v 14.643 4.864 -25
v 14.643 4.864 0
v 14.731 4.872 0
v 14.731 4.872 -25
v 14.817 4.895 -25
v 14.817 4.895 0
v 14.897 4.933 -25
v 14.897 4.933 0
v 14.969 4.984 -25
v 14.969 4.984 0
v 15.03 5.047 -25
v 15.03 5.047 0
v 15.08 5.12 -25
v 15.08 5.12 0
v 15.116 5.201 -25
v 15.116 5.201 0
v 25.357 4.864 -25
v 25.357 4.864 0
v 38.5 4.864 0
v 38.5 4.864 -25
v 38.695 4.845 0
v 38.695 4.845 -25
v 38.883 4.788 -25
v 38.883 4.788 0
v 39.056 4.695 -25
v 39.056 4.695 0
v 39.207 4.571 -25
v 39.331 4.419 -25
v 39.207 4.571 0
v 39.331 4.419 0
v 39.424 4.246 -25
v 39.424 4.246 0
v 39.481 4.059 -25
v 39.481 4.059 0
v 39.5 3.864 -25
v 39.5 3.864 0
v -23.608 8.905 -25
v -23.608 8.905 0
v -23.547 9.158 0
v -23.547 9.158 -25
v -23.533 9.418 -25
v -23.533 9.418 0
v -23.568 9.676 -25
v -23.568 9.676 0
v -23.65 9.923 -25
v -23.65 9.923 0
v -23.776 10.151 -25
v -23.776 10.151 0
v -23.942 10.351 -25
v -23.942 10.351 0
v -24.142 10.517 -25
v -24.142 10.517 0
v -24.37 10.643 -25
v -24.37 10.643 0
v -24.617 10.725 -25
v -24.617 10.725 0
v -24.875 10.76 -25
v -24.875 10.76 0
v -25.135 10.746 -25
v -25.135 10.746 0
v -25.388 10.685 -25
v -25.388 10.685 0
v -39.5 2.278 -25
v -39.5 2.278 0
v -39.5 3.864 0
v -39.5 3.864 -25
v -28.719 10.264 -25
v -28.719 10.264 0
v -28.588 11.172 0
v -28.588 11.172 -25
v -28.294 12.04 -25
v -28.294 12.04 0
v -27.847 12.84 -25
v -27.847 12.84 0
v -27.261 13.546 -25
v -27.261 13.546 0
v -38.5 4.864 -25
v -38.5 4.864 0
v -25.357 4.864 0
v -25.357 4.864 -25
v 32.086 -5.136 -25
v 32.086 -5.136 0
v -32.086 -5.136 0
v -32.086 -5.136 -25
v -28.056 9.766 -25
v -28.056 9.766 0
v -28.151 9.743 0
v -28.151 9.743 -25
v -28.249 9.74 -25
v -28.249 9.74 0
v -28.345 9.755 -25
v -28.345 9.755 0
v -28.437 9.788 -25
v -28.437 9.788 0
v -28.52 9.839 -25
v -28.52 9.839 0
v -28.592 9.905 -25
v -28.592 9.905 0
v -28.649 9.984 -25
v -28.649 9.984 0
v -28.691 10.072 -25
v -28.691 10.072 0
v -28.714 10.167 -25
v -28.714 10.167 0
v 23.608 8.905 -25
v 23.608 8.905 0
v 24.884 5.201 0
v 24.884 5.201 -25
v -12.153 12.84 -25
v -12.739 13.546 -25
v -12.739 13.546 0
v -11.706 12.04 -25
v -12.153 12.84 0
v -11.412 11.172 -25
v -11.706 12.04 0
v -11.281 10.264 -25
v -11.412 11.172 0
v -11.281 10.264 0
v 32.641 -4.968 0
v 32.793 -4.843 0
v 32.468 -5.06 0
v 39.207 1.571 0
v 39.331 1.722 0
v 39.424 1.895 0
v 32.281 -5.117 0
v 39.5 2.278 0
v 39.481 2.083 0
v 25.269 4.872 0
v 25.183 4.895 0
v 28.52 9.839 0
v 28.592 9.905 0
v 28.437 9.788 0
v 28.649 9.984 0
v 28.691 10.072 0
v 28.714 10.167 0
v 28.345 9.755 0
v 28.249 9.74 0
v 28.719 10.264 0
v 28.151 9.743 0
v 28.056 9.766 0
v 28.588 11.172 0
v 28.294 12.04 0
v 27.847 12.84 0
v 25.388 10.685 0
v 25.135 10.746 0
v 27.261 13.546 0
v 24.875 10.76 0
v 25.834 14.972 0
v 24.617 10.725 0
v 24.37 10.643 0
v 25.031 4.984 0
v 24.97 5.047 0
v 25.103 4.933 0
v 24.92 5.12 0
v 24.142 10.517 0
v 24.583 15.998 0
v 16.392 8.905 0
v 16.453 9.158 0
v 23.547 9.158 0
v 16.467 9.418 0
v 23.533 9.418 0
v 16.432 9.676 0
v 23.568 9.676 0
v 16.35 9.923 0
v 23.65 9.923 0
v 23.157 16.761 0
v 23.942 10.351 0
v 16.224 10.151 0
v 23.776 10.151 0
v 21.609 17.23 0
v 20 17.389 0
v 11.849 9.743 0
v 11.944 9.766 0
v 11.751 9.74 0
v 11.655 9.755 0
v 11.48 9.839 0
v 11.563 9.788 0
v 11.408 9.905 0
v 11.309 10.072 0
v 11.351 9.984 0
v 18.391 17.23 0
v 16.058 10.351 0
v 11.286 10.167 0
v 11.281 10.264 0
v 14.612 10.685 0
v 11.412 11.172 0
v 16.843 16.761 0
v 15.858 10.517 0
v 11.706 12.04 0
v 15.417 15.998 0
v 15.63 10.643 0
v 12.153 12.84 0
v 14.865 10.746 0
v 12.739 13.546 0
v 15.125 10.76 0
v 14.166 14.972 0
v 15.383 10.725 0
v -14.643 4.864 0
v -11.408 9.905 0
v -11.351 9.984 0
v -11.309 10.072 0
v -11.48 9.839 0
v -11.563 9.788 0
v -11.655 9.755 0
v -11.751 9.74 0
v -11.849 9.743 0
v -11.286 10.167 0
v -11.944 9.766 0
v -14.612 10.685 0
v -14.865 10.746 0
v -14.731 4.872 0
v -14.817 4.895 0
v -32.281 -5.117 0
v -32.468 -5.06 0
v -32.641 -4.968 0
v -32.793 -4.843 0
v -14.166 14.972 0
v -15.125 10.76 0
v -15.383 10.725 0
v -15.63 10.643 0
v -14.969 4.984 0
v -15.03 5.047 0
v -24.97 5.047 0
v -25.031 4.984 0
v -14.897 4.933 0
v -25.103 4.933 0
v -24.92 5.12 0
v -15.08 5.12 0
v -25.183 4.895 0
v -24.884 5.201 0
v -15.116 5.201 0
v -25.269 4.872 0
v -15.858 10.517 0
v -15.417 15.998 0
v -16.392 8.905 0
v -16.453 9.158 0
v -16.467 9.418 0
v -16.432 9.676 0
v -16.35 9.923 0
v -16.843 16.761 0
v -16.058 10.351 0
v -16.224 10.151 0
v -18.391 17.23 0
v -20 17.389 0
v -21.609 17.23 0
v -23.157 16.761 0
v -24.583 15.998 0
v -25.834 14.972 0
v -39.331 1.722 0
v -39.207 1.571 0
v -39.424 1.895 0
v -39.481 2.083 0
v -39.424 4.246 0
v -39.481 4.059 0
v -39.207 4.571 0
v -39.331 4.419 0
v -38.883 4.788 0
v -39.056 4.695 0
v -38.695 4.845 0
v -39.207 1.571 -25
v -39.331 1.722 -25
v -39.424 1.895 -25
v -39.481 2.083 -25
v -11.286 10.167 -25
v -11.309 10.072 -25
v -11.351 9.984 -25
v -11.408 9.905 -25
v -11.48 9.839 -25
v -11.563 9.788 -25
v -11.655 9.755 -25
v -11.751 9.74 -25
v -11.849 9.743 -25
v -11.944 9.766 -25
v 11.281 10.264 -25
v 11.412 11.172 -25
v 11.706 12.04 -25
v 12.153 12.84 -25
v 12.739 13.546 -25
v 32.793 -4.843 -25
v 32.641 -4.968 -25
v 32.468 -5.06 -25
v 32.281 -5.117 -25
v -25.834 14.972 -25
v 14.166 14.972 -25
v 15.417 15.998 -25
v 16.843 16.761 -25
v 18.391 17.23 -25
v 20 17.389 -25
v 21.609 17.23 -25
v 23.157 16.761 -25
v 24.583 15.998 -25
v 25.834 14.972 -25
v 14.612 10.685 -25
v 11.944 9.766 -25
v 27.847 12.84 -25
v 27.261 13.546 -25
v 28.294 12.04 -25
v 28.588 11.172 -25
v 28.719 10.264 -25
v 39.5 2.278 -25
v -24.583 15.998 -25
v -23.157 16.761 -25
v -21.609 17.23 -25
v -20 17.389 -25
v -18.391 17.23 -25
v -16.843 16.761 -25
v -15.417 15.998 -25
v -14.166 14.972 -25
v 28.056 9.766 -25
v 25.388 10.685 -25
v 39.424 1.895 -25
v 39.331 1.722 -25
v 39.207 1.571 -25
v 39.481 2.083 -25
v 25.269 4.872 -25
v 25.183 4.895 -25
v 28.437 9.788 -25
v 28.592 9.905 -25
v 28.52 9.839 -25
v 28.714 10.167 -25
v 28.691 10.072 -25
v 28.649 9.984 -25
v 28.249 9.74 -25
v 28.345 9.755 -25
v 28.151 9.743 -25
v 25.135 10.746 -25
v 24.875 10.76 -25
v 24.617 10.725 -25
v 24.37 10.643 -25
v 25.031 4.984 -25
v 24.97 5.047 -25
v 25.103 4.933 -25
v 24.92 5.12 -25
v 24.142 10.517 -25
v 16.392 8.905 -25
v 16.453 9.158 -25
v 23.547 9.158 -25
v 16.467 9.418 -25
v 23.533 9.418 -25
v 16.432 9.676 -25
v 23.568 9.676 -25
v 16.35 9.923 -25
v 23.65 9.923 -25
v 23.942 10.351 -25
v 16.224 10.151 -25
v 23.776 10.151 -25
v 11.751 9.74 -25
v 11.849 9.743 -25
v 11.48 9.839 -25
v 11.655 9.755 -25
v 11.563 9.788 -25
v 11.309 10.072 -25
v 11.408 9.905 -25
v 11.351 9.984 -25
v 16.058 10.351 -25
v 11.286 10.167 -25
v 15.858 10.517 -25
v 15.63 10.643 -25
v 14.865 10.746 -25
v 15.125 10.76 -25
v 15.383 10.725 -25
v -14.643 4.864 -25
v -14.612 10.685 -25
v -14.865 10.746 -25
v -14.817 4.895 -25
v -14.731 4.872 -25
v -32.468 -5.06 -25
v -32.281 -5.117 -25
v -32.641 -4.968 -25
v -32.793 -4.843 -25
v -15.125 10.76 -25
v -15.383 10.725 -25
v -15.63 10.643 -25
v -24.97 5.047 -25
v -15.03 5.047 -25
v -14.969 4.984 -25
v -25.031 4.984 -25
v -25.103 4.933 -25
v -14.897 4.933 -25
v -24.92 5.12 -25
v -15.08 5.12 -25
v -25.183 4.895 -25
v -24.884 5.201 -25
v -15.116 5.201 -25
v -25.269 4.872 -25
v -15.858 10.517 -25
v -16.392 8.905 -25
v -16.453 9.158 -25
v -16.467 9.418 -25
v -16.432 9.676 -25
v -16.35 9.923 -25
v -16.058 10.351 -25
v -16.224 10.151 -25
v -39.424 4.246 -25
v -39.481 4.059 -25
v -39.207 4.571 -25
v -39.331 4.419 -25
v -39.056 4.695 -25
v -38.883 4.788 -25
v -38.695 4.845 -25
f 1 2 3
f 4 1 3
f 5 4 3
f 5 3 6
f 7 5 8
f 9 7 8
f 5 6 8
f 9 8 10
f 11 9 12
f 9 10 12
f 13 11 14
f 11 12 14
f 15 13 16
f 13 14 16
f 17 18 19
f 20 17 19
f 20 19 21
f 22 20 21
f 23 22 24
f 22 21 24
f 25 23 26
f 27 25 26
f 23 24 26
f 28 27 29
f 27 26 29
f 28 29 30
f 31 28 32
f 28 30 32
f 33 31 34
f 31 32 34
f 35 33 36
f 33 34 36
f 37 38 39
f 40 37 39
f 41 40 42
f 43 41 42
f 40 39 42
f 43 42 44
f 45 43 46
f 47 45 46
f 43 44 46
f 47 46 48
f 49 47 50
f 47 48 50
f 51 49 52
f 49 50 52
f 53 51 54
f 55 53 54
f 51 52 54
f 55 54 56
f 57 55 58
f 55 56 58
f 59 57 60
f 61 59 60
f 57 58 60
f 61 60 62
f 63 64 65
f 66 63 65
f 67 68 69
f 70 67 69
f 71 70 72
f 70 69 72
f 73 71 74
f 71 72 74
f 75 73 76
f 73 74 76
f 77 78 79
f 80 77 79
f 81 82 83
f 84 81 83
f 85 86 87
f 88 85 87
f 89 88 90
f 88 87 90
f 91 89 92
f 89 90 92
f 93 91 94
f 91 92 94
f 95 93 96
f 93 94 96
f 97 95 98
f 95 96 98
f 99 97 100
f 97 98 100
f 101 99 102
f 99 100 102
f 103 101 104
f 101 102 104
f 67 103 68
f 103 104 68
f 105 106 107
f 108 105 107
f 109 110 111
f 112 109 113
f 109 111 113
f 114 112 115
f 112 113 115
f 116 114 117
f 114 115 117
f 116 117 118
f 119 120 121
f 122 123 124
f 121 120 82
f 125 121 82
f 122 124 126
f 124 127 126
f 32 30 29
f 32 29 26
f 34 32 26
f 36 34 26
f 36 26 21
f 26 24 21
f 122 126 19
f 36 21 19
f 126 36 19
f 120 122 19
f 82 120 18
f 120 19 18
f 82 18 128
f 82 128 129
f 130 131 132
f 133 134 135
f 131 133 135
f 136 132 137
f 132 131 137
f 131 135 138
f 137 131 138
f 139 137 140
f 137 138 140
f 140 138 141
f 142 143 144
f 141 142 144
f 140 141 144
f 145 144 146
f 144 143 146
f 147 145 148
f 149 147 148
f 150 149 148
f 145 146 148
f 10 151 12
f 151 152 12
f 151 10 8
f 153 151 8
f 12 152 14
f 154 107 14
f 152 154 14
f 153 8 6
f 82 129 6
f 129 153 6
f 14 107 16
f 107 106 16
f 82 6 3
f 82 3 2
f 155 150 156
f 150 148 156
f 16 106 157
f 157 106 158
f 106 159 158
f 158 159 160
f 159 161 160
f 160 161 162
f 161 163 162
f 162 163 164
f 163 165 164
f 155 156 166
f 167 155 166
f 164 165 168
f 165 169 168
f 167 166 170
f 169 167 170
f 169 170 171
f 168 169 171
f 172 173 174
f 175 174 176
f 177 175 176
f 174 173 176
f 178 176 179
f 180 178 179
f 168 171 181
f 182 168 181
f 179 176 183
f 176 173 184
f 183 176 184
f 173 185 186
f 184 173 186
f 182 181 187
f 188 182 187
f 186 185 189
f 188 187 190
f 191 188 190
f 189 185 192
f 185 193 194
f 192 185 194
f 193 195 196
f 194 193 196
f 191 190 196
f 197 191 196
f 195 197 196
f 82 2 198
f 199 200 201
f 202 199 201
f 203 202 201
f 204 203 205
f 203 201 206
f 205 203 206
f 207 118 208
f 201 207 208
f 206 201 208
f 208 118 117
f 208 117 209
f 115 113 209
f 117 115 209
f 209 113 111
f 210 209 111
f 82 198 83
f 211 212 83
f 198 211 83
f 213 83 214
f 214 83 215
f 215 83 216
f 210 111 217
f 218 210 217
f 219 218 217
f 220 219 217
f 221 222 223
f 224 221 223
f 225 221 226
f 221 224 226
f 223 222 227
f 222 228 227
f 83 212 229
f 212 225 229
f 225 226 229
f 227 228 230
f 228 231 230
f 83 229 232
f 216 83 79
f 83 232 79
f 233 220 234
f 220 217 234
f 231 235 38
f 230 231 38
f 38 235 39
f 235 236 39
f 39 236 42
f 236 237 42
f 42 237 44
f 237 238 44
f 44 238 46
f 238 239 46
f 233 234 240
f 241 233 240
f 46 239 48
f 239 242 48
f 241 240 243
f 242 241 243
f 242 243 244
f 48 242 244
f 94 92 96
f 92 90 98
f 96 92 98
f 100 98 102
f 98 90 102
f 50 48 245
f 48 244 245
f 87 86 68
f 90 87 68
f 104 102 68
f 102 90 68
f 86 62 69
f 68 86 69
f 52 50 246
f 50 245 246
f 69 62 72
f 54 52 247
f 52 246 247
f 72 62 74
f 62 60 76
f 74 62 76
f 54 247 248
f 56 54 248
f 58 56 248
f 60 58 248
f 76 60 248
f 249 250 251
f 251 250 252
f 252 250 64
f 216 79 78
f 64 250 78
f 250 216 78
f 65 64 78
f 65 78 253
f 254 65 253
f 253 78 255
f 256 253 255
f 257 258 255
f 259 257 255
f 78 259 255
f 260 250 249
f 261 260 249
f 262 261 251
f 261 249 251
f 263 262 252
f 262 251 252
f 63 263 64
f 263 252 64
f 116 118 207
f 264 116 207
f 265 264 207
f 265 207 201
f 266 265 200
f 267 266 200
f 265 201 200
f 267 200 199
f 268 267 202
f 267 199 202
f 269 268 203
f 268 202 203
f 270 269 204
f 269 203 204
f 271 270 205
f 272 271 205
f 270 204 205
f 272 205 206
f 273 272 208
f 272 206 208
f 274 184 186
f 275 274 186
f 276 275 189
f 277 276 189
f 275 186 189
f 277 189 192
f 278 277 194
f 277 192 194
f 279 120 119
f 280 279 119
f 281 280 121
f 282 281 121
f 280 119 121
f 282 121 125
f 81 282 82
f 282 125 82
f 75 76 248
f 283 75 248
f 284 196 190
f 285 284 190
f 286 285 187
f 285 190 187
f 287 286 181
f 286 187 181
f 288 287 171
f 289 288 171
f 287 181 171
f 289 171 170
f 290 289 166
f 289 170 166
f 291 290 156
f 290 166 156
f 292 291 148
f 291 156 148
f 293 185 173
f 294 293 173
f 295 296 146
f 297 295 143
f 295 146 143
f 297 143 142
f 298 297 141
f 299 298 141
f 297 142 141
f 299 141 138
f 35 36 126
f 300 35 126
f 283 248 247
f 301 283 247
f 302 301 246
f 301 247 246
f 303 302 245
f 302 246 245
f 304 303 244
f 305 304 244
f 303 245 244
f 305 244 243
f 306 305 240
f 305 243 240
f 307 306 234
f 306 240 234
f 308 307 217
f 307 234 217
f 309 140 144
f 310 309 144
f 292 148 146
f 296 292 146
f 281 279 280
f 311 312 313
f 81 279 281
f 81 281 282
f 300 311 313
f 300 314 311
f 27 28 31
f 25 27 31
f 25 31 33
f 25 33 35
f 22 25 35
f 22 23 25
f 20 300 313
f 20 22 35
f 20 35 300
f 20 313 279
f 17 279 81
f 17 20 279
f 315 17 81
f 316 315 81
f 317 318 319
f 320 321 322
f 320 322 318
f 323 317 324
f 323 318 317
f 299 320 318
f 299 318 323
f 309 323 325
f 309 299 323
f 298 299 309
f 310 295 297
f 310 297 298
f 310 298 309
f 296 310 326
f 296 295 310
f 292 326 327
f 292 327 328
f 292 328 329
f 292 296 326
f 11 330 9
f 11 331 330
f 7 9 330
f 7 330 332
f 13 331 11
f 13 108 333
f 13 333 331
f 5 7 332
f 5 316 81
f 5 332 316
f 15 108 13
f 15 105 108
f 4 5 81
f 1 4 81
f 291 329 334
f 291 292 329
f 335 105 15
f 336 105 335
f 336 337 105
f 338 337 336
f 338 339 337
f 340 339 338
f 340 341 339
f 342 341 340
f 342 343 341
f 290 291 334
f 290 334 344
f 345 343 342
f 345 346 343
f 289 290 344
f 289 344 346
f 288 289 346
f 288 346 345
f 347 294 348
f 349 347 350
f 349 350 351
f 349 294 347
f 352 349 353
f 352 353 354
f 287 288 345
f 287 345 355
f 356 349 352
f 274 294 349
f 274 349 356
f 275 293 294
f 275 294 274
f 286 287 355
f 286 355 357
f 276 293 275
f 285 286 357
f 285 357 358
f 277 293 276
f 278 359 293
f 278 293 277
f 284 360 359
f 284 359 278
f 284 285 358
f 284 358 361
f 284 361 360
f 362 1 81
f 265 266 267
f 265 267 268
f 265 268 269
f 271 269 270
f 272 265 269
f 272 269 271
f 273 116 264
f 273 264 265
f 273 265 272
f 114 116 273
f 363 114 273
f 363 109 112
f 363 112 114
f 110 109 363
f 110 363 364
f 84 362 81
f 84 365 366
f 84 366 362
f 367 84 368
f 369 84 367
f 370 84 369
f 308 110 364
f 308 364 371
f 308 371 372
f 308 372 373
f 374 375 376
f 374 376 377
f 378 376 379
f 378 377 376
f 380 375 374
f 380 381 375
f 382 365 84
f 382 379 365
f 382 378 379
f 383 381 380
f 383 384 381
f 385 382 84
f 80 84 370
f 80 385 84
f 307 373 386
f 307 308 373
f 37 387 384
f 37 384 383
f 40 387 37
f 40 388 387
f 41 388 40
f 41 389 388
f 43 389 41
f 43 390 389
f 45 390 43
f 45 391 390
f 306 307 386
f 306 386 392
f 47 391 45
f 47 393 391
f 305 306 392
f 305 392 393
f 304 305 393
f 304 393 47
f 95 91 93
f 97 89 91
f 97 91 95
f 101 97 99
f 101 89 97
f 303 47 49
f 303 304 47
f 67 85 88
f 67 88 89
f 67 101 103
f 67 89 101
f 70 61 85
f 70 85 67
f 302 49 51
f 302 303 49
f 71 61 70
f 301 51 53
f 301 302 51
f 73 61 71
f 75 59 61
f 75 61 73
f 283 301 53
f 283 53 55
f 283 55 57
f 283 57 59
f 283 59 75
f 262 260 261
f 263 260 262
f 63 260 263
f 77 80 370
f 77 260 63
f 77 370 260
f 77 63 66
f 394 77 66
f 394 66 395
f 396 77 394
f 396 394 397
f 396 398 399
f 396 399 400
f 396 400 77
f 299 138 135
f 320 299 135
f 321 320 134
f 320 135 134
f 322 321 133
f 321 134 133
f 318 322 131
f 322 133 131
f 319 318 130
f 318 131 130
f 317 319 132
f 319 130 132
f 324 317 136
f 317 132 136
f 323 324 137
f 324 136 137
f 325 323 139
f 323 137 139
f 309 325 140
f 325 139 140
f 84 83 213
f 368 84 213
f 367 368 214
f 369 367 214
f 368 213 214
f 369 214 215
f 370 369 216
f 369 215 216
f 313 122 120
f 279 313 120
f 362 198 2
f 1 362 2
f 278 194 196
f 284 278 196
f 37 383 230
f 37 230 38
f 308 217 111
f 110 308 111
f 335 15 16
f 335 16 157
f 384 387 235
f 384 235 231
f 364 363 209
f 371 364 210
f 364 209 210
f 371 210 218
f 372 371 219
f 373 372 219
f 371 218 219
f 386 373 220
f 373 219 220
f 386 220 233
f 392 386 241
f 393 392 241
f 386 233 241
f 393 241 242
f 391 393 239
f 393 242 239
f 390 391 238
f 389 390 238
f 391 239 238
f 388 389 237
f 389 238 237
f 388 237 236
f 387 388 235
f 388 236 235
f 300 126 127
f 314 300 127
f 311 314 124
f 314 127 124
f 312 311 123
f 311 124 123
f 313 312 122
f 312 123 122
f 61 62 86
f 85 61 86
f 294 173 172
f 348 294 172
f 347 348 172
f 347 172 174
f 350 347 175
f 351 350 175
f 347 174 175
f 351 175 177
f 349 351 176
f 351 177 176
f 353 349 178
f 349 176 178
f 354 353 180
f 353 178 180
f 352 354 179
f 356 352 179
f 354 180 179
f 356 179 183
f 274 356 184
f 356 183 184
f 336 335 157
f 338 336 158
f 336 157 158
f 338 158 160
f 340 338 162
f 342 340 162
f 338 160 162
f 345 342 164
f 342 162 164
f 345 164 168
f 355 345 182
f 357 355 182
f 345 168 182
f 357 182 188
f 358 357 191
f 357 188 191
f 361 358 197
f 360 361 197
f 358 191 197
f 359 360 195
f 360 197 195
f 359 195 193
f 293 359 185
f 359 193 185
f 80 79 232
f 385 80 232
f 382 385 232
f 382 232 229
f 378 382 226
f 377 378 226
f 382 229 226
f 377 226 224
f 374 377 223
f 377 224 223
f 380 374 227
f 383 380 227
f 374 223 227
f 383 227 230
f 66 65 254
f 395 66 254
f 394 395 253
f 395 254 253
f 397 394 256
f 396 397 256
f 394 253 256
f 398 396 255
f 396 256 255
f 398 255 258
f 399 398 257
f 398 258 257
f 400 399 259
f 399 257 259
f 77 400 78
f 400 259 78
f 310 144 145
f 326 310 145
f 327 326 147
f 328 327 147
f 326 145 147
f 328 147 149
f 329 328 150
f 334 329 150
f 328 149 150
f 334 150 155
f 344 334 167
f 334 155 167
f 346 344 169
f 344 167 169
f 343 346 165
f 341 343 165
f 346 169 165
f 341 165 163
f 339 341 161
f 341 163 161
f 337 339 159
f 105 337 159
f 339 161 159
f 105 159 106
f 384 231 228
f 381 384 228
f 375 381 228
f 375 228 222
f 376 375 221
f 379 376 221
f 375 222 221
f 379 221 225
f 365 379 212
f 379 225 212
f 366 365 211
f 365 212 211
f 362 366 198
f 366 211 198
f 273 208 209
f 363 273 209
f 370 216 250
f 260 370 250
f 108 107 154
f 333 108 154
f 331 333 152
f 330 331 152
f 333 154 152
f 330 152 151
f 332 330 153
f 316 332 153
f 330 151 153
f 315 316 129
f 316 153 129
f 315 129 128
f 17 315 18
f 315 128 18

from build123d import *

# Parameters (mm, degrees)
MAIN_EXTRUSION_DEPTH = 25


with BuildPart() as part:
    # Sk Main Extrusion → Main Extrusion (new body)
    with BuildSketch(Plane.XY):
        with BuildLine():
            Line((-38.5, 4.863775977), (-25.356646534, 4.863775977))
            ThreePointArc((-25.356646534, 4.863775977), (-25.066295056, 4.956718218), (-24.883887246, 5.2009919))
            Line((-24.883887246, 5.2009919), (-23.608380992, 8.905331037))
            ThreePointArc((-23.608380992, 8.905331037), (-23.942157504, 10.351075947), (-25.387902414, 10.684852459))
            Line((-25.387902414, 10.684852459), (-28.056395253, 9.766016689))
            ThreePointArc((-28.056395253, 9.766016689), (-28.51978883, 9.839233829), (-28.718532589, 10.264198857))
            ThreePointArc((-28.718532589, 10.264198857), (-28.294243331, 12.040244762), (-27.260533906, 13.545503961))
            Line((-27.260533906, 13.545503961), (-25.833630945, 14.972406922))
            ThreePointArc((-25.833630945, 14.972406922), (-20, 17.388775977), (-14.166369055, 14.972406922))
            Line((-14.166369055, 14.972406922), (-12.739466094, 13.545503961))
            ThreePointArc((-12.739466094, 13.545503961), (-11.705756669, 12.040244762), (-11.281467411, 10.264198857))
            ThreePointArc((-11.281467411, 10.264198857), (-11.48021117, 9.839233829), (-11.943604747, 9.766016689))
            Line((-11.943604747, 9.766016689), (-14.612097586, 10.684852459))
            ThreePointArc((-14.612097586, 10.684852459), (-16.057842496, 10.351075947), (-16.391619008, 8.905331037))
            Line((-16.391619008, 8.905331037), (-15.116112754, 5.2009919))
            ThreePointArc((-15.116112754, 5.2009919), (-14.933704944, 4.956718218), (-14.643353466, 4.863775977))
            Line((-14.643353466, 4.863775977), (14.643353466, 4.863775977))
            ThreePointArc((14.643353466, 4.863775977), (14.933704944, 4.956718218), (15.116112754, 5.2009919))
            Line((15.116112754, 5.2009919), (16.391619008, 8.905331037))
            ThreePointArc((16.391619008, 8.905331037), (16.057842496, 10.351075947), (14.612097586, 10.684852459))
            Line((14.612097586, 10.684852459), (11.943604747, 9.766016689))
            ThreePointArc((11.943604747, 9.766016689), (11.48021117, 9.839233829), (11.281467411, 10.264198857))
            ThreePointArc((11.281467411, 10.264198857), (11.705756669, 12.040244762), (12.739466094, 13.545503961))
            Line((12.739466094, 13.545503961), (14.166369055, 14.972406922))
            ThreePointArc((14.166369055, 14.972406922), (20, 17.388775977), (25.833630945, 14.972406922))
            Line((25.833630945, 14.972406922), (27.260533906, 13.545503961))
            ThreePointArc((27.260533906, 13.545503961), (28.294243331, 12.040244762), (28.718532589, 10.264198857))
            ThreePointArc((28.718532589, 10.264198857), (28.51978883, 9.839233829), (28.056395253, 9.766016689))
            Line((28.056395253, 9.766016689), (25.387902414, 10.684852459))
            ThreePointArc((25.387902414, 10.684852459), (23.942157504, 10.351075947), (23.608380992, 8.905331037))
            Line((23.608380992, 8.905331037), (24.883887246, 5.2009919))
            ThreePointArc((24.883887246, 5.2009919), (25.066295056, 4.956718218), (25.356646534, 4.863775977))
            Line((25.356646534, 4.863775977), (38.5, 4.863775977))
            ThreePointArc((38.5, 4.863775977), (39.207106781, 4.570882758), (39.5, 3.863775977))
            Line((39.5, 3.863775977), (39.5, 2.277989539))
            ThreePointArc((39.5, 2.277989539), (39.423879533, 1.895306107), (39.207106781, 1.570882758))
            Line((39.207106781, 1.570882758), (32.792893219, -4.843330804))
            ThreePointArc((32.792893219, -4.843330804), (32.46846987, -5.060103556), (32.085786438, -5.136224023))
            Line((32.085786438, -5.136224023), (-32.085786438, -5.136224023))
            ThreePointArc((-32.085786438, -5.136224023), (-32.46846987, -5.060103556), (-32.792893219, -4.843330804))
            Line((-32.792893219, -4.843330804), (-39.207106781, 1.570882758))
            ThreePointArc((-39.207106781, 1.570882758), (-39.423879533, 1.895306107), (-39.5, 2.277989539))
            Line((-39.5, 2.277989539), (-39.5, 3.863775977))
            ThreePointArc((-39.5, 3.863775977), (-39.207106781, 4.570882758), (-38.5, 4.863775977))
        make_face()
    extrude(amount=-MAIN_EXTRUSION_DEPTH)


solid = part.part
